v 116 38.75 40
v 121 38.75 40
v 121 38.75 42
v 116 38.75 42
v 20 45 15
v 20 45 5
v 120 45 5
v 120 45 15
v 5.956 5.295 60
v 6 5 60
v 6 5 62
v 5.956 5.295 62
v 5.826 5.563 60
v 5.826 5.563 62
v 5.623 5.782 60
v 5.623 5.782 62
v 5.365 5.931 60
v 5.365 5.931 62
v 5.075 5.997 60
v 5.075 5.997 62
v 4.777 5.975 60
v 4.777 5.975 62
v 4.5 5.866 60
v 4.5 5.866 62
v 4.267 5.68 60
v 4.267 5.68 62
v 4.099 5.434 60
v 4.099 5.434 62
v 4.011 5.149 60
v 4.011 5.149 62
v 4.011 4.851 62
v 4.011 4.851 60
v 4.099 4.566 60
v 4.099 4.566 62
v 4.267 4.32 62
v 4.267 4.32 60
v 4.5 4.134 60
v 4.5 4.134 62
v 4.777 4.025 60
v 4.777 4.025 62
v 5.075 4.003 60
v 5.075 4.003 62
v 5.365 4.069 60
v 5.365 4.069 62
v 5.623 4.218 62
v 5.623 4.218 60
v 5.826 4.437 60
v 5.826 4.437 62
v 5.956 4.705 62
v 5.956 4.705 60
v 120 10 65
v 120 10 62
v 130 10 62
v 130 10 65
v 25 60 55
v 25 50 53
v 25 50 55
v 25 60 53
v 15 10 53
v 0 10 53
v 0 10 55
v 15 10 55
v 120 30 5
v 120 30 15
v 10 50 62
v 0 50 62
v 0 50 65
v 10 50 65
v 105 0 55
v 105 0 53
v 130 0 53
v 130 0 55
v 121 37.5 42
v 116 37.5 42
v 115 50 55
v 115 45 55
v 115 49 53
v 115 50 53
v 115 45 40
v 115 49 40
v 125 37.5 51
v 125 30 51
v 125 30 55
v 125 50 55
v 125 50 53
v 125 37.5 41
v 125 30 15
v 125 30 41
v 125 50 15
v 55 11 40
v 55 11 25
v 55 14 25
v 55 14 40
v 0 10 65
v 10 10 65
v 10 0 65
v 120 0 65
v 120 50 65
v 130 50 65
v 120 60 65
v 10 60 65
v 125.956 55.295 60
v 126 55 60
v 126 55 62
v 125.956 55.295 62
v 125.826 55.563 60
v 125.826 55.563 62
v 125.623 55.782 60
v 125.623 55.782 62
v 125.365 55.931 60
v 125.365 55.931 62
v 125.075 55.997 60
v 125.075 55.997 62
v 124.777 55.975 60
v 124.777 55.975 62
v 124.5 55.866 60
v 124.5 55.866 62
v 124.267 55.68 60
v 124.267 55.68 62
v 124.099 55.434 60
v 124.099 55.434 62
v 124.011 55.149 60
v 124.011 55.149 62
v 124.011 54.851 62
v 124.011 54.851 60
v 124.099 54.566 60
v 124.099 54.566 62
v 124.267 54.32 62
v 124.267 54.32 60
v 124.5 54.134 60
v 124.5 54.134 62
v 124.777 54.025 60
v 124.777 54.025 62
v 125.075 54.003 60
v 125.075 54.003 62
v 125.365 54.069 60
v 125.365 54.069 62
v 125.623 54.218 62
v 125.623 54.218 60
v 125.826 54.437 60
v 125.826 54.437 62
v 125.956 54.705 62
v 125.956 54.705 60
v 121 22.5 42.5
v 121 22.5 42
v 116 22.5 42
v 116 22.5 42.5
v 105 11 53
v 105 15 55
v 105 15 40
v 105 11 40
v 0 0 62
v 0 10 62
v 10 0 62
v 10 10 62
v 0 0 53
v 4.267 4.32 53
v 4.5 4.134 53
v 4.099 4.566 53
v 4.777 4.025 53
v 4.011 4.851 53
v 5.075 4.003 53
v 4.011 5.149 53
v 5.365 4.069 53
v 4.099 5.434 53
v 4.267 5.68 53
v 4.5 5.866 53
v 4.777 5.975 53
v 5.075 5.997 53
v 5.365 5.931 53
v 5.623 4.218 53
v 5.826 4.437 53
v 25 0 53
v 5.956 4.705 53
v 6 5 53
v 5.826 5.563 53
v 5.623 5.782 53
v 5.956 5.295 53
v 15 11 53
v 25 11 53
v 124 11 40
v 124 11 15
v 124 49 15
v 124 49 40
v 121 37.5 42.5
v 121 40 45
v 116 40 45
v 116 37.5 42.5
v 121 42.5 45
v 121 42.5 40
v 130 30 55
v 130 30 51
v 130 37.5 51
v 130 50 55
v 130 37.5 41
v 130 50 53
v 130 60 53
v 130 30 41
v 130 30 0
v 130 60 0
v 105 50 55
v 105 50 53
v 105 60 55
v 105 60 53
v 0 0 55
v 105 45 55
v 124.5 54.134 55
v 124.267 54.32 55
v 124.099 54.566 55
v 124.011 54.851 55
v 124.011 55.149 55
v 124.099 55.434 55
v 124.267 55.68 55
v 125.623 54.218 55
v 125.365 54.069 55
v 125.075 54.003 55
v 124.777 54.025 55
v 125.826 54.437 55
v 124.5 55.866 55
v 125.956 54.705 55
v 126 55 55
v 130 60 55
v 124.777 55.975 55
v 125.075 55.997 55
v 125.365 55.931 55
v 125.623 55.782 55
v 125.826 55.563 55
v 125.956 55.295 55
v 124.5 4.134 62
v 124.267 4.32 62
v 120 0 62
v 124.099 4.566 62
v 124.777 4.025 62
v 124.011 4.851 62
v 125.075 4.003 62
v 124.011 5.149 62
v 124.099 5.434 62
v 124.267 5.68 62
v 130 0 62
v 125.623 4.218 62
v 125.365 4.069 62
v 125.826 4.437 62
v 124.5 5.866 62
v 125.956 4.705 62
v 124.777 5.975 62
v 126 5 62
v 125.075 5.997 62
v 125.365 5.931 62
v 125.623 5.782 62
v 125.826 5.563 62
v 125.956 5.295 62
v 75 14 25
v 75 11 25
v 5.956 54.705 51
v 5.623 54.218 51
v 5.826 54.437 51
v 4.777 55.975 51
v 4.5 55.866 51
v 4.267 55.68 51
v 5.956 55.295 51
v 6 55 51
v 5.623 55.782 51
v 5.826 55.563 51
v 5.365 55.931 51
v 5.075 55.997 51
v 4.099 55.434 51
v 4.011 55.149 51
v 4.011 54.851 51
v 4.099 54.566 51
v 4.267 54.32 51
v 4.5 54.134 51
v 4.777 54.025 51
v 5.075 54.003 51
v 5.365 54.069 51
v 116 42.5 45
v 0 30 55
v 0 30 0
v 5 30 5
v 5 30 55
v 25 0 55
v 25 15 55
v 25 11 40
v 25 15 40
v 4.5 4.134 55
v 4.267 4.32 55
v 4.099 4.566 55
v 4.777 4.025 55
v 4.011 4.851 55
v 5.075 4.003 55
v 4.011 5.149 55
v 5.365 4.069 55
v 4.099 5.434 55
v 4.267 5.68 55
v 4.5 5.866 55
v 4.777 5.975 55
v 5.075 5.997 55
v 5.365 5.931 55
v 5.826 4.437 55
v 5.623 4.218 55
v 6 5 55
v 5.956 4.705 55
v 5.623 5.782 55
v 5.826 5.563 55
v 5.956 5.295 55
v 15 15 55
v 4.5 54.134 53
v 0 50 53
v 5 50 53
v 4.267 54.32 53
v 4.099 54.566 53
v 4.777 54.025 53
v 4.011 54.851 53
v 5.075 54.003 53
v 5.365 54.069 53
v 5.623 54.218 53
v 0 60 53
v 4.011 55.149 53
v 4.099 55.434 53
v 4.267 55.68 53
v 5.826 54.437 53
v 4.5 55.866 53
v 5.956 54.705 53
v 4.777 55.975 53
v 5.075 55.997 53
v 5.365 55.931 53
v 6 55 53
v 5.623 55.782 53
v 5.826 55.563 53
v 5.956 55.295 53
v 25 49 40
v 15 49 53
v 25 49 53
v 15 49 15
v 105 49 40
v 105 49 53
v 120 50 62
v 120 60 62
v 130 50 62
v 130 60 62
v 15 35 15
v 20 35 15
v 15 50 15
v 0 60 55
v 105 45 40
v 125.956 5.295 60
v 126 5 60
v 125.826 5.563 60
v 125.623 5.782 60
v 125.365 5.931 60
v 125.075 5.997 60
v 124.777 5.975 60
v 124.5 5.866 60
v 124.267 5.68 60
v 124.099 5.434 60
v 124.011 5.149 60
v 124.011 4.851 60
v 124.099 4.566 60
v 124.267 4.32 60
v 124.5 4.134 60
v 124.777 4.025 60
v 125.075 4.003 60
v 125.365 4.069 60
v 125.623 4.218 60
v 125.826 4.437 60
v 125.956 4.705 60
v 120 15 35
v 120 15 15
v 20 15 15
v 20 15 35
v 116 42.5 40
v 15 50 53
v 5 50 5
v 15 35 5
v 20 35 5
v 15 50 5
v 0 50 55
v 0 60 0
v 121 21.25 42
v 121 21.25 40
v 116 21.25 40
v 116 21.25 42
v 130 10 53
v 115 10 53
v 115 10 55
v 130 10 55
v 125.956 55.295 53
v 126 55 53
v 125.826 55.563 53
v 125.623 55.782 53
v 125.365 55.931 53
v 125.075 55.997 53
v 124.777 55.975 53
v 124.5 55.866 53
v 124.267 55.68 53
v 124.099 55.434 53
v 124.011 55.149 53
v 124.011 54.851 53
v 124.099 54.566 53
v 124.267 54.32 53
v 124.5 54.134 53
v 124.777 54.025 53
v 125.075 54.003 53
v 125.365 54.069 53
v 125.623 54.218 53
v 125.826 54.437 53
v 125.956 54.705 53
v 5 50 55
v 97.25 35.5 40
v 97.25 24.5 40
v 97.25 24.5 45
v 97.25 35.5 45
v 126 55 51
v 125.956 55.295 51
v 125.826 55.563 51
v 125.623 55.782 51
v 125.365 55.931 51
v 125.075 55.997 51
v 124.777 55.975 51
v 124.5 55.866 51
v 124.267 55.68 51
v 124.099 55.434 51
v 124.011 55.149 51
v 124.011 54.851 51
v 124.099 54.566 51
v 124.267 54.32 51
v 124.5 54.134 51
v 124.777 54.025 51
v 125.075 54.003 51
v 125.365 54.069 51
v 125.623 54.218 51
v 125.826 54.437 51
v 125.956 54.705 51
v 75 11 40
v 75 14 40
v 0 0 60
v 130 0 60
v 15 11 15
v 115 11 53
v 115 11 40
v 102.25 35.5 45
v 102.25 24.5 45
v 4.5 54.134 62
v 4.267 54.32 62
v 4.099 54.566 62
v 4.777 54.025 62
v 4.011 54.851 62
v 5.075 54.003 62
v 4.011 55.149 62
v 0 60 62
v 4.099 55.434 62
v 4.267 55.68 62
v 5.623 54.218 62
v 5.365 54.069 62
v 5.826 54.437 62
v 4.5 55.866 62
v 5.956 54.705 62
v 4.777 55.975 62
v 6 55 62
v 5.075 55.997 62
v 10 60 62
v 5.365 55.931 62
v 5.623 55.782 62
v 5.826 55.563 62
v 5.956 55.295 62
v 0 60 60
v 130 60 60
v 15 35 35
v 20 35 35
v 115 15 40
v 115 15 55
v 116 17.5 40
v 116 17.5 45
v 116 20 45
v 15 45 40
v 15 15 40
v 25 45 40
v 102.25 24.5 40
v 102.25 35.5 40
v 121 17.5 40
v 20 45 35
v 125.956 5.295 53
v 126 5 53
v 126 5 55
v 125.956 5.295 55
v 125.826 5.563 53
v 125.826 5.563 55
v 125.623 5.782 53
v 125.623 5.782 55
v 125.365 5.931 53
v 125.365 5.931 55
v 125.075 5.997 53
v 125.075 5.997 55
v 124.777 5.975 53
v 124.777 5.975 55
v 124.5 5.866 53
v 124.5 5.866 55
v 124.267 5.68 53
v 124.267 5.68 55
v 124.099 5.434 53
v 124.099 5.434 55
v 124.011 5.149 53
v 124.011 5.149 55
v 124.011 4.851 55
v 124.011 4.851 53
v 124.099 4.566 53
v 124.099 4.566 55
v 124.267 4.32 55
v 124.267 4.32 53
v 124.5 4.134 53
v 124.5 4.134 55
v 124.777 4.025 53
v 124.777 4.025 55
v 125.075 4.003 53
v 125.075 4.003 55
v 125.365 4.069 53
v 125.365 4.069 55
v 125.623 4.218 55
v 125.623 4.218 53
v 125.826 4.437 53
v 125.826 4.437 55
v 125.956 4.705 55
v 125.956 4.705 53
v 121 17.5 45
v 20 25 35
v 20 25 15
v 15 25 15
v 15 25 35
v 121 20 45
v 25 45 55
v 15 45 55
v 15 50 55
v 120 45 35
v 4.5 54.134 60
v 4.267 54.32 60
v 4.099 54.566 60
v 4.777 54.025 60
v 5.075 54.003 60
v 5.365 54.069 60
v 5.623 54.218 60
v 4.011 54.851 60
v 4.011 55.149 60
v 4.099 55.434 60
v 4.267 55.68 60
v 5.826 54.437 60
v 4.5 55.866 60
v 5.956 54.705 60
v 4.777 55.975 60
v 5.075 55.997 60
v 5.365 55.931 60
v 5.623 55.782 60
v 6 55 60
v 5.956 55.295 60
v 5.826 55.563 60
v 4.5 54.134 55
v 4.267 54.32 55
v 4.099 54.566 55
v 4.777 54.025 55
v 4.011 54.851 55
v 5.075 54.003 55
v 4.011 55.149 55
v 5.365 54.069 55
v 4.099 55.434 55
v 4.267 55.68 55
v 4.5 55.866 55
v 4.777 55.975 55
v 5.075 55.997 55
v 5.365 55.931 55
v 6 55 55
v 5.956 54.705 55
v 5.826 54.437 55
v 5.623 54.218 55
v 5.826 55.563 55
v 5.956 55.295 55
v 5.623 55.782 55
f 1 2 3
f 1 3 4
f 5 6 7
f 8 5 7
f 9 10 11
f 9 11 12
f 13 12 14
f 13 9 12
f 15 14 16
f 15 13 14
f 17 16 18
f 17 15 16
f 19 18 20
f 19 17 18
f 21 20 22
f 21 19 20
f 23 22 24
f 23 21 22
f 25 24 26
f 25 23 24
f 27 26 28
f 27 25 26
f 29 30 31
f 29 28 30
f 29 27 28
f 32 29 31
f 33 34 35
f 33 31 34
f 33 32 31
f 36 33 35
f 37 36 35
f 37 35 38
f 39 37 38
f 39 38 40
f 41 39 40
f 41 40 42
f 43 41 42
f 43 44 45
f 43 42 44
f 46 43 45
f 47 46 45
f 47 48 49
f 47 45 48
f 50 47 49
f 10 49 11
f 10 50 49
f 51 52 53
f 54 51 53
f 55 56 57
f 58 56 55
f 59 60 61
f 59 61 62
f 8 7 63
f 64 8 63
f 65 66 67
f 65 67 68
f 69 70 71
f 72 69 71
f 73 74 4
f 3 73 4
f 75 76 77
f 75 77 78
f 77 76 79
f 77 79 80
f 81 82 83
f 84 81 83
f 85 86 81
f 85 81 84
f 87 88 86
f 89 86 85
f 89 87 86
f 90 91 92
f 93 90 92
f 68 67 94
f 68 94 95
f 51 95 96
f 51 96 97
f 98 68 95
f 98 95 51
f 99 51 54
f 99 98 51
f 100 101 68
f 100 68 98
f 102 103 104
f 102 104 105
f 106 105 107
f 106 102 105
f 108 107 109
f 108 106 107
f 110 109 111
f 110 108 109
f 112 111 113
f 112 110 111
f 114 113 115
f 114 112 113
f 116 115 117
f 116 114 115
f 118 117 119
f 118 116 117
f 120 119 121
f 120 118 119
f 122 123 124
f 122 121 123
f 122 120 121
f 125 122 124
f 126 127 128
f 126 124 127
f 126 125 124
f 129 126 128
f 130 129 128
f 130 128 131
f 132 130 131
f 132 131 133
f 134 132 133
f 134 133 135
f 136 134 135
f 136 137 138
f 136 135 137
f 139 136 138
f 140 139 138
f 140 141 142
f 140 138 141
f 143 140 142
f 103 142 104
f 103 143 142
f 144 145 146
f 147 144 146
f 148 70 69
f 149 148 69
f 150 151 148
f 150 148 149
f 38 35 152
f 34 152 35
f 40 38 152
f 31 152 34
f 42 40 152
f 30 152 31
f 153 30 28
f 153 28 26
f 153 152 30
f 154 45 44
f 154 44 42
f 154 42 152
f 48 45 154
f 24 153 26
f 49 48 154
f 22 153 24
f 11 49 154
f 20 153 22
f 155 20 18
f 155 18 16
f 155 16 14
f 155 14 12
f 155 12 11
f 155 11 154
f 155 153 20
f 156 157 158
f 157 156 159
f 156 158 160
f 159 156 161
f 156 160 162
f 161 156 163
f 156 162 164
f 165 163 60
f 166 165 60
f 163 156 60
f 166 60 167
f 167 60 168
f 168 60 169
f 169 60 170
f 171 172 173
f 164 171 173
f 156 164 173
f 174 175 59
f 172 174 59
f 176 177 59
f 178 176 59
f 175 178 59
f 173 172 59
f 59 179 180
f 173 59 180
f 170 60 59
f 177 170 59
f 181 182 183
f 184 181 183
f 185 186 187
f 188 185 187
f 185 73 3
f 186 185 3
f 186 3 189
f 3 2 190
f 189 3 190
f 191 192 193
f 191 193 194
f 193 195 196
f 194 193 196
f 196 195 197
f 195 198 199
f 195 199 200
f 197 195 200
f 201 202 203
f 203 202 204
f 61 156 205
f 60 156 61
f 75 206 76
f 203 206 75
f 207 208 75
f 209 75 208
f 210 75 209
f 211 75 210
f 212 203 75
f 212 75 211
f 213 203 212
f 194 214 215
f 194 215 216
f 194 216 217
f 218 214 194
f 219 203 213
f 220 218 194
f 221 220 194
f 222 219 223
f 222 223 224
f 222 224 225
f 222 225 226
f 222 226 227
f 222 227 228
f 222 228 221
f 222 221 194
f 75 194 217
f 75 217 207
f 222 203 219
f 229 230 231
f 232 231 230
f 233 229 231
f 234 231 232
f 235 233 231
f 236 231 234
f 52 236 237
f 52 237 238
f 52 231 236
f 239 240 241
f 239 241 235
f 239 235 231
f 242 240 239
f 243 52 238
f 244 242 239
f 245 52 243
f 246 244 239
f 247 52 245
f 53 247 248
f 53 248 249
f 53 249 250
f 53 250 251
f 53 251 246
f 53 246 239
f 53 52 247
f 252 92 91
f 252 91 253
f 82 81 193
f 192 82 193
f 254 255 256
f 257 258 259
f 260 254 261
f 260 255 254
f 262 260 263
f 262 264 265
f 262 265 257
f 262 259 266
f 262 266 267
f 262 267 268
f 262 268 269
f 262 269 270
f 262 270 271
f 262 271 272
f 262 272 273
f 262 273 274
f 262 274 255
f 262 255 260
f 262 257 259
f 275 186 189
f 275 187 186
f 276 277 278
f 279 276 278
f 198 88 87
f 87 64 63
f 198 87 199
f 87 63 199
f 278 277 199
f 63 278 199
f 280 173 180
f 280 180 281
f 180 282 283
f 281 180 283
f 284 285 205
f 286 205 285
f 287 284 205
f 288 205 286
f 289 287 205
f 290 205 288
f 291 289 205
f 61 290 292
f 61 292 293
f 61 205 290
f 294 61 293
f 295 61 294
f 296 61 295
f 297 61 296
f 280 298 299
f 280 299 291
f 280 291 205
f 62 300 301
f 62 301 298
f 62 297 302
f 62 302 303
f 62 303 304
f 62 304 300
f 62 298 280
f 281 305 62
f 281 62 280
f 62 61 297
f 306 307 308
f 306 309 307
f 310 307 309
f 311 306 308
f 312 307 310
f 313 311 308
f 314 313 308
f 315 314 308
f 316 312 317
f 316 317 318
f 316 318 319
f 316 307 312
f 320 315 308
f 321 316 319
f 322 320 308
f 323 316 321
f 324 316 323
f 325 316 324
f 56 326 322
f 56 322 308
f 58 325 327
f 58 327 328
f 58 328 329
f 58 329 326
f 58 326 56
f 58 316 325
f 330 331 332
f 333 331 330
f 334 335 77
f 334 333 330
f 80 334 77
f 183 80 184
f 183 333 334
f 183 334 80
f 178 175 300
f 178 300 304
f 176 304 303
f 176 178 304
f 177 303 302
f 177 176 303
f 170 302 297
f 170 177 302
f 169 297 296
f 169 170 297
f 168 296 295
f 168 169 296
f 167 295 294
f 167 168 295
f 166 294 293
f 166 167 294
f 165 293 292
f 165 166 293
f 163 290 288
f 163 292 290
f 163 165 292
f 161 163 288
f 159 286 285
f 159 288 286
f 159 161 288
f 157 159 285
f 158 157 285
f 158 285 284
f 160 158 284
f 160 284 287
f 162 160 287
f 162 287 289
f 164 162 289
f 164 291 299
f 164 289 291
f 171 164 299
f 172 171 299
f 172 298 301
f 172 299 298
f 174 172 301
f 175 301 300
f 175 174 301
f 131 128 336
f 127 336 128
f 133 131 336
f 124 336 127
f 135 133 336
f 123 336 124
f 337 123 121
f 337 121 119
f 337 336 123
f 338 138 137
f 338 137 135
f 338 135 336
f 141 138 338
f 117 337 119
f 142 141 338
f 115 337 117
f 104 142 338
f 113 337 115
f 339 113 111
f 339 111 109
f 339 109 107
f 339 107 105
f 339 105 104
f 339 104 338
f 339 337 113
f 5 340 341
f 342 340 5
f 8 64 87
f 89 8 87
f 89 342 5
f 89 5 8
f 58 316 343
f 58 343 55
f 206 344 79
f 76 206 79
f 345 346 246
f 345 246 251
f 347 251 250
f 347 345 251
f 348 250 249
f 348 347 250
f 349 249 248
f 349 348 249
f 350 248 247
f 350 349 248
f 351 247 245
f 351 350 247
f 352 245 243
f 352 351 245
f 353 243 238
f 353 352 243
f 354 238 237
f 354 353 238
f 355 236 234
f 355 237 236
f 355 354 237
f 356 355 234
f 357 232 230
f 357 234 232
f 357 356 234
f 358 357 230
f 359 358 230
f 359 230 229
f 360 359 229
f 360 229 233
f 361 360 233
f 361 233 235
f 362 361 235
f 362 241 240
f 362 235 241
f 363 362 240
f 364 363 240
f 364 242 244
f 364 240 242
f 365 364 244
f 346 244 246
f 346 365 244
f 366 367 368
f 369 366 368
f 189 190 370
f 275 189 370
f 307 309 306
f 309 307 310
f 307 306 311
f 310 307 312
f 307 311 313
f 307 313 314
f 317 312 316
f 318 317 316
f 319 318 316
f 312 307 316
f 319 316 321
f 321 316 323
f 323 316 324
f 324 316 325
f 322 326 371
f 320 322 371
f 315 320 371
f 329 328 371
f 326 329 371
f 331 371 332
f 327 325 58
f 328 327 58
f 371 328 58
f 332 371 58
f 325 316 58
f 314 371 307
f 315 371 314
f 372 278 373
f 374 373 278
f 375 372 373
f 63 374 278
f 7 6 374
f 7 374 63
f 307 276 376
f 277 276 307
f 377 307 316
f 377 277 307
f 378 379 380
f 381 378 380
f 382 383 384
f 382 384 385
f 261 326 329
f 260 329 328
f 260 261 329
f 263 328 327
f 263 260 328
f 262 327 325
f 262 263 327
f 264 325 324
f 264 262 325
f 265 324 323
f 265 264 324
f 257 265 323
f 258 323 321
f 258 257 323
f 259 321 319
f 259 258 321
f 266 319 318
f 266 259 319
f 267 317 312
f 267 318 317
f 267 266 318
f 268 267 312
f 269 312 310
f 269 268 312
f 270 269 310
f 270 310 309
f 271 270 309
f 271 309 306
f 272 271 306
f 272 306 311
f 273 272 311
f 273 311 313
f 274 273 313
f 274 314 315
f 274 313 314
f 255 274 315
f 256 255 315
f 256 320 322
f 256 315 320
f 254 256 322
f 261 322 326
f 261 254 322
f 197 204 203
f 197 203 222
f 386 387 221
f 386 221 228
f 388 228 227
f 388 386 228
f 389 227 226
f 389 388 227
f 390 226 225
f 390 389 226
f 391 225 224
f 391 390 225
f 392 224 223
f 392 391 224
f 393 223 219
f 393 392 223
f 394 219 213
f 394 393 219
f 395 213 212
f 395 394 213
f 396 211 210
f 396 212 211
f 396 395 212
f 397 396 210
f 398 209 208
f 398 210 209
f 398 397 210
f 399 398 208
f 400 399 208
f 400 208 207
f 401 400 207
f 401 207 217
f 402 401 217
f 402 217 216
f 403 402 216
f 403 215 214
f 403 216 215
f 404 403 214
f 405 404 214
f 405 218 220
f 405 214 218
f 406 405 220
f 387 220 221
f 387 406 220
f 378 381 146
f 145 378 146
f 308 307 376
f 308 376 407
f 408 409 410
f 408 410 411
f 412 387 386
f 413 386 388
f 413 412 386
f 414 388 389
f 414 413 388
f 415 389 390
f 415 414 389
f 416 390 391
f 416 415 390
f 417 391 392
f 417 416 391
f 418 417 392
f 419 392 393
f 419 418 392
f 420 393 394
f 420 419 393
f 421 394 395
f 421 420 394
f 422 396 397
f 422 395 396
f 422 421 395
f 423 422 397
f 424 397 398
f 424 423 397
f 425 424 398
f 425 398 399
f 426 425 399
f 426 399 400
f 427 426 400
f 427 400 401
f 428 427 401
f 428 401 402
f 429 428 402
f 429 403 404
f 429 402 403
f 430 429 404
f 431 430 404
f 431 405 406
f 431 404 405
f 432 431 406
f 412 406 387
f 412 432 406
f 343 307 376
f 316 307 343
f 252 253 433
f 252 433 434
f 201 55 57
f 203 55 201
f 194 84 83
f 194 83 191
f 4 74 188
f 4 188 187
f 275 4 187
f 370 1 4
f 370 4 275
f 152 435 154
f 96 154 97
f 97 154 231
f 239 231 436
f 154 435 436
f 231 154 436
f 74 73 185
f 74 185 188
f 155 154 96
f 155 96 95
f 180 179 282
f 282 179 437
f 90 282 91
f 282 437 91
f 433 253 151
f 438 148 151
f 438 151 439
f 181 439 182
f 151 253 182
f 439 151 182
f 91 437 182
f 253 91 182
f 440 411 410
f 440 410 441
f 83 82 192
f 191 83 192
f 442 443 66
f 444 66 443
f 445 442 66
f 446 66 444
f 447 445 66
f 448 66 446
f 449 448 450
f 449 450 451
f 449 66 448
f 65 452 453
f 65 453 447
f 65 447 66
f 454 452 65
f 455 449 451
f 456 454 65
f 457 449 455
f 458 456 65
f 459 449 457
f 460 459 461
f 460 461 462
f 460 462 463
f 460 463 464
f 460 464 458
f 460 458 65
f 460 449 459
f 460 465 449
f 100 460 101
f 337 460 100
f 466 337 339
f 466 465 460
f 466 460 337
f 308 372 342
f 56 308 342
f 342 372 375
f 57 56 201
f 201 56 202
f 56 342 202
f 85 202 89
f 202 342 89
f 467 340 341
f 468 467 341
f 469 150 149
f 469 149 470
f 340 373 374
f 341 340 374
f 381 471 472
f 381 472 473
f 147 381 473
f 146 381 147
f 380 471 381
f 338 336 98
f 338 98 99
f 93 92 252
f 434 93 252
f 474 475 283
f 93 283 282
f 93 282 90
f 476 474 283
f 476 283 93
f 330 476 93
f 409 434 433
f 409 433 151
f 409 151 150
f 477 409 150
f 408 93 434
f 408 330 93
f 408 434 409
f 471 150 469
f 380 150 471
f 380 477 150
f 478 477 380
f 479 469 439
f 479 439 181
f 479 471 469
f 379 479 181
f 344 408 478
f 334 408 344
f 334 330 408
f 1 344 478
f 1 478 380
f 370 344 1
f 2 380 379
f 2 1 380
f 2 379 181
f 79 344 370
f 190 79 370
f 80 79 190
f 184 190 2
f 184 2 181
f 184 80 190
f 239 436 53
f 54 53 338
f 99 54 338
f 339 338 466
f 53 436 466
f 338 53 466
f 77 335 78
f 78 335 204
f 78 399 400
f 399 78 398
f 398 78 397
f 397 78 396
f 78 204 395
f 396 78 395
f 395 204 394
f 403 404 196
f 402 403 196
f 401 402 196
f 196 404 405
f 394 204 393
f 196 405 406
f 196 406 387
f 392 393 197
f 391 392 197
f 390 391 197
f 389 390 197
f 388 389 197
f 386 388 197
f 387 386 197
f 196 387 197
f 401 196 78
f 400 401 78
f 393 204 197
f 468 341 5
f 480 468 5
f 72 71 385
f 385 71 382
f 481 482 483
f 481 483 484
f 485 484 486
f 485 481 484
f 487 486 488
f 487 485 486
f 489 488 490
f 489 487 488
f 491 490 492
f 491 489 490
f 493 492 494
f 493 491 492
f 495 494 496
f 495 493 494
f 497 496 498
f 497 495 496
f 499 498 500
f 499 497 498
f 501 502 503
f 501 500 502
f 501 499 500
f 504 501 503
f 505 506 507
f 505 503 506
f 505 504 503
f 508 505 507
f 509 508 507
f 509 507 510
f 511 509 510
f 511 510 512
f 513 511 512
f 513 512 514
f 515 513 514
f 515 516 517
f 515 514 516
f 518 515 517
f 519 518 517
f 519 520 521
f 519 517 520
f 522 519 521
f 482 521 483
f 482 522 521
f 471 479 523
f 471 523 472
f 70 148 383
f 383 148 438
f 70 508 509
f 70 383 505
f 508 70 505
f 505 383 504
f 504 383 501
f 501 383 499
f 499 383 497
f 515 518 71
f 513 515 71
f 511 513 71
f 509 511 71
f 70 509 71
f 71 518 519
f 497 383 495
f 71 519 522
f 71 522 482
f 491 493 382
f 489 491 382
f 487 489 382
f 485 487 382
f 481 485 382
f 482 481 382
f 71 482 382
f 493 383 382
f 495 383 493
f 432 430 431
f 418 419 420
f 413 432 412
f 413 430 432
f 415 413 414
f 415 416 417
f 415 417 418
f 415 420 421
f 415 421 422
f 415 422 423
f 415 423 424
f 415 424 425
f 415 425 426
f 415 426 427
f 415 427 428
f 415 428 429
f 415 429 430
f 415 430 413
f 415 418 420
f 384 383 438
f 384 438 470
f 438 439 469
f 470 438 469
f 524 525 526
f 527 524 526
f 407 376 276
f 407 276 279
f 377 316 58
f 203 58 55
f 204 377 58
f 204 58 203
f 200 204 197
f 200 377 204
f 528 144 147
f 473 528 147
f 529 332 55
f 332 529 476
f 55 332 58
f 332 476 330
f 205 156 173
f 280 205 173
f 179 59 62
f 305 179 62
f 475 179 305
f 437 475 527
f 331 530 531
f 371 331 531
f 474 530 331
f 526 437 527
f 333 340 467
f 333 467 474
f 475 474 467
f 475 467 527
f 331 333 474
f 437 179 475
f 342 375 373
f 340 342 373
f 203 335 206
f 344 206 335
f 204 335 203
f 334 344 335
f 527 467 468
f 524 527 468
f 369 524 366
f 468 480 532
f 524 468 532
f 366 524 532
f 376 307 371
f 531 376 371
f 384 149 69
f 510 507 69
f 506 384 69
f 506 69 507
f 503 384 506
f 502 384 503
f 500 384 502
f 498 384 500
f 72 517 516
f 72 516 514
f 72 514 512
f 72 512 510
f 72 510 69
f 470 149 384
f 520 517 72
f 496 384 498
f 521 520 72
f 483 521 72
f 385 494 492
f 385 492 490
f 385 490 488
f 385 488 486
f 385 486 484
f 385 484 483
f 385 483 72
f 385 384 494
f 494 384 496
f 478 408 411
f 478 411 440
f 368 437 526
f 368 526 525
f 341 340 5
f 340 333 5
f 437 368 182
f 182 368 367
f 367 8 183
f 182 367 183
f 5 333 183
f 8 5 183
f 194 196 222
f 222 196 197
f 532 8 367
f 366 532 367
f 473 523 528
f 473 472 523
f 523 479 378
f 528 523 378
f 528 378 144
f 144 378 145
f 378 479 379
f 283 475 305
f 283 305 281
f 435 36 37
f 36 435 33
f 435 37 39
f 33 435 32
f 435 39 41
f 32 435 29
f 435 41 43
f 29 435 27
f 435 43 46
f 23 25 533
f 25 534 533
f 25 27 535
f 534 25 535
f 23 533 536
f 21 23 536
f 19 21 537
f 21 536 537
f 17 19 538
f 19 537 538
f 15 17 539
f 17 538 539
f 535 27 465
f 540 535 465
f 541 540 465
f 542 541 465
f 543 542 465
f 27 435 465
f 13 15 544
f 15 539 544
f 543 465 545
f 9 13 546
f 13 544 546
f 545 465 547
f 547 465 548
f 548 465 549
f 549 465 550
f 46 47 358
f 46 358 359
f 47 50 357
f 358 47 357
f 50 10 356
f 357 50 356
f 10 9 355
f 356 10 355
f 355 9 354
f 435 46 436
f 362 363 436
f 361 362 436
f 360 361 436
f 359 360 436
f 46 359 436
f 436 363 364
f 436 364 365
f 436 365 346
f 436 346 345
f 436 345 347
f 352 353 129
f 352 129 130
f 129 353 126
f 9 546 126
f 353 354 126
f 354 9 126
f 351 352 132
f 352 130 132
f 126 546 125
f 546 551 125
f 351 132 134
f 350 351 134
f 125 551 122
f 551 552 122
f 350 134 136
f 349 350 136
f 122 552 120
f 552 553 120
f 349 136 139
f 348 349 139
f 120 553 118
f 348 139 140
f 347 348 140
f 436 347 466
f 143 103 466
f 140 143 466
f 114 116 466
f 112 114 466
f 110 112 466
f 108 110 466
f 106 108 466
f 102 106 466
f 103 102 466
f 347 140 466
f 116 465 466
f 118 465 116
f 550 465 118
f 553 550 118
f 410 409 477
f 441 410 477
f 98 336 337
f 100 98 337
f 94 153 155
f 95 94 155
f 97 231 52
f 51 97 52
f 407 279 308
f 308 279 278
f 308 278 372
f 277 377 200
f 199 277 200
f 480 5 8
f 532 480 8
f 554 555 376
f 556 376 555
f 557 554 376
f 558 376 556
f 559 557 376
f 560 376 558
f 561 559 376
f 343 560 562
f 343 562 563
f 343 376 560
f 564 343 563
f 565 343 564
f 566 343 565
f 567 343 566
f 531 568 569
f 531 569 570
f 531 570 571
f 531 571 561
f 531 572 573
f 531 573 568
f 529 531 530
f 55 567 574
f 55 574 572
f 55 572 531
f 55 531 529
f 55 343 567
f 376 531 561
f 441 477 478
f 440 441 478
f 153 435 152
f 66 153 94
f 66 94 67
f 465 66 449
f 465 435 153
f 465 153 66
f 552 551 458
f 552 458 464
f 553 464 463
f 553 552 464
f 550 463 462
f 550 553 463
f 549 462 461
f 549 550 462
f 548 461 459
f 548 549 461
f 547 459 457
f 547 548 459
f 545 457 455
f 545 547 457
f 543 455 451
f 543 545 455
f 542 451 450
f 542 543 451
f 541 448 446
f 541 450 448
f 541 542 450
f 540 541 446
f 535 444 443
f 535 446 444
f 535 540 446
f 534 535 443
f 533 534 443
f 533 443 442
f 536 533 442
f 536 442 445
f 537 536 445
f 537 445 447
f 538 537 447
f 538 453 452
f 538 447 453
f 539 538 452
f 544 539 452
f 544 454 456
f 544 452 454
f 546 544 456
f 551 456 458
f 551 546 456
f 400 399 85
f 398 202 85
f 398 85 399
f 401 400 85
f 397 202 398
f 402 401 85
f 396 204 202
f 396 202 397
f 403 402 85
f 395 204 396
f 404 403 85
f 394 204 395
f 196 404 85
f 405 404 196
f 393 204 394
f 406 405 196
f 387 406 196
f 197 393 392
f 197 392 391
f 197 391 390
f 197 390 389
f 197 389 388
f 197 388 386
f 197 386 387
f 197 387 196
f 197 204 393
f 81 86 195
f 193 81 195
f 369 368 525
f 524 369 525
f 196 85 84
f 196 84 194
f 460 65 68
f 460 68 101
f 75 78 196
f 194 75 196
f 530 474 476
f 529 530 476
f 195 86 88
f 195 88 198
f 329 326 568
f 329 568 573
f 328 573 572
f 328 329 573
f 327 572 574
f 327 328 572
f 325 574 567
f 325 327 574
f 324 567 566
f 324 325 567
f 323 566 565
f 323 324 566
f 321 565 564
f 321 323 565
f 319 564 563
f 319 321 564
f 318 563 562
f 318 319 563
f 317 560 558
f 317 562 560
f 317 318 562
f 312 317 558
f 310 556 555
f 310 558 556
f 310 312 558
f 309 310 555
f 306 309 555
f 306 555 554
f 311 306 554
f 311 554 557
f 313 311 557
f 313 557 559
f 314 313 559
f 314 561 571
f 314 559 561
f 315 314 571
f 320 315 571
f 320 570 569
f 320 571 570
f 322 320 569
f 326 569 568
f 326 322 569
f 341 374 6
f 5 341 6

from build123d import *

# Parameters (mm, degrees)
CYLINDER002_R           = 1
CYLINDER002_DEPTH       = 20
BOX007_W                = 10
BOX007_H                = 10
BOX007_DEPTH            = 10
ARRAY005_X_COUNT        = 2
ARRAY005_X_PITCH        = 120
ARRAY005_Y_COUNT        = 2
ARRAY005_Y_PITCH        = 50
BOX002_W                = 130
BOX002_H                = 60
BOX002_DEPTH            = 5
BOX015_W                = 20
BOX015_H                = 3
BOX015_DEPTH            = 15
CYLINDER003_R           = 1
CYLINDER003_DEPTH       = 10
ARRAY009_X_COUNT        = 2
ARRAY009_X_PITCH        = 120
ARRAY009_Y_COUNT        = 2
ARRAY009_Y_PITCH        = 50
BOX011_W                = 25
BOX011_H                = 10
BOX011_DEPTH            = 2
ARRAY008_X_COUNT        = 2
ARRAY008_X_PITCH        = 105
ARRAY008_Y_COUNT        = 2
ARRAY008_Y_PITCH        = 50
BOX010_W                = 10
BOX010_H                = 15
BOX010_DEPTH            = 2
ARRAY007_X_COUNT        = 2
ARRAY007_X_PITCH        = 90
ARRAY007_Y_COUNT        = 2
ARRAY007_Y_PITCH        = 45
BOX009_W                = 10
BOX009_H                = 4
BOX009_DEPTH            = 15
ARRAY006_X_COUNT        = 2
ARRAY006_X_PITCH        = 90
ARRAY006_Y_COUNT        = 2
ARRAY006_Y_PITCH        = 34
BOX008_W                = 109
BOX008_H                = 38
BOX008_DEPTH            = 5
PAD001_DEPTH            = 20
SKETCH002_W             = 5
SKETCH002_H             = 11
PAD002_DEPTH            = 5
BOX013_W                = 17.5
BOX013_H                = 5
BOX013_DEPTH            = 2
BOX012_W                = 5
BOX012_H                = 5
BOX012_DEPTH            = 5
ARRAY010_X_COUNT        = 2
ARRAY010_X_PITCH        = 20
CHAMFER_SIZE            = 2.5
CHAMFER_PLACEMENT_ANGLE = 90
BOX016_W                = 130
BOX016_H                = 30
BOX016_DEPTH            = 60
BOX014_W                = 7
BOX014_H                = 15
BOX014_DEPTH            = 10
CYLINDER001_R           = 1
CYLINDER001_DEPTH       = 3
ARRAY004_X_COUNT        = 2
ARRAY004_X_PITCH        = 120
ARRAY004_Y_COUNT        = 2
ARRAY004_Y_PITCH        = 50
CYLINDER_R              = 1.5
CYLINDER_DEPTH          = 30
CYLINDER_ROLL_ANGLE     = 90
ARRAY003_X_COUNT        = 2
ARRAY003_X_PITCH        = 50
ARRAY003_Y_COUNT        = 2
ARRAY003_Y_PITCH        = 20
BOX006_W                = 25
BOX006_H                = 10
BOX006_DEPTH            = 2
ARRAY002_X_COUNT        = 2
ARRAY002_X_PITCH        = 105
ARRAY002_Y_COUNT        = 2
ARRAY002_Y_PITCH        = 50
BOX005_W                = 10
BOX005_H                = 10
BOX005_DEPTH            = 10
ARRAY001_X_COUNT        = 2
ARRAY001_X_PITCH        = 50
BOX004_W                = 10
BOX004_H                = 2
BOX004_DEPTH            = 10
ARRAY_X_COUNT           = 2
ARRAY_X_PITCH           = 50
ARRAY_Y_COUNT           = 2
ARRAY_Y_PITCH           = 20
BOX003_W                = 60
BOX003_H                = 10
BOX003_DEPTH            = 30
BOX001_W                = 120
BOX001_H                = 40
BOX001_DEPTH            = 50
BOX_W                   = 130
BOX_H                   = 60
BOX_DEPTH               = 55
PAD_DEPTH               = 10


with BuildPart() as cilindro002:
    # Cylinder002 → Cylinder002 (new body)
    with BuildSketch(Plane(origin=(5, 5, -5), x_dir=(1, 0, 0), z_dir=(0, 0, 1))):
        Circle(CYLINDER002_R)
    extrude(amount=CYLINDER002_DEPTH)


with BuildPart() as huecostapa:
    # Box007 → Box007 (new body)
    with BuildSketch(Plane.XY):
        with Locations((5, 5)):
            Rectangle(BOX007_W, BOX007_H)
    extrude(amount=BOX007_DEPTH)

    # Fusion: union Cilindro002
    add(cilindro002.part)

    # Array005 X: HuecosTapa ×2


with BuildPart() as huecostapa_1:
    add(huecostapa.part)
    with Locations(*[(i * ARRAY005_X_PITCH, 0, 0) for i in range(1, ARRAY005_X_COUNT)]):
        add(huecostapa.part)

    # Array005 Y: HuecosTapa ×2


with BuildPart() as huecostapa_2:
    add(huecostapa_1.part)
    with Locations(*[(0, i * ARRAY005_Y_PITCH, 0) for i in range(1, ARRAY005_Y_COUNT)]):
        add(huecostapa_1.part)


with BuildPart() as huecostapa_3:
    # Array005 placement: moved
    add(huecostapa_2.part.moved(Location((0, 0, 62))))


with BuildPart() as tapa:
    # Box002 → Box002 (new body)
    with BuildSketch(Plane.XY.offset(60)):
        with Locations((65, 30)):
            Rectangle(BOX002_W, BOX002_H)
    extrude(amount=BOX002_DEPTH)

    # Cut007: cut HuecosTapa
    add(huecostapa_3.part, mode=Mode.SUBTRACT)


with BuildPart() as hueco_tornillo_conector:
    # Box015 → Box015 (new body)
    with BuildSketch(Plane(origin=(55, 11, 25), x_dir=(1, 0, 0), z_dir=(0, 0, 1))):
        with Locations((10, 1.5)):
            Rectangle(BOX015_W, BOX015_H)
    extrude(amount=BOX015_DEPTH)


with BuildPart() as array009:
    # Cylinder003 → Cylinder003 (new body)
    with BuildSketch(Plane.XY):
        Circle(CYLINDER003_R)
    extrude(amount=CYLINDER003_DEPTH)

    # Array009 X: Array009 ×2


with BuildPart() as array009_1:
    add(array009.part)
    with Locations(*[(i * ARRAY009_X_PITCH, 0, 0) for i in range(1, ARRAY009_X_COUNT)]):
        add(array009.part)

    # Array009 Y: Array009 ×2


with BuildPart() as array009_2:
    add(array009_1.part)
    with Locations(*[(0, i * ARRAY009_Y_PITCH, 0) for i in range(1, ARRAY009_Y_COUNT)]):
        add(array009_1.part)


with BuildPart() as array009_3:
    # Array009 placement: moved
    add(array009_2.part.moved(Location((-10, -6, 13))))


with BuildPart() as array008:
    # Box011 → Box011 (new body)
    with BuildSketch(Plane(origin=(-15, -11, 18), x_dir=(1, 0, 0), z_dir=(0, 0, 1))):
        with Locations((12.5, 5)):
            Rectangle(BOX011_W, BOX011_H)
    extrude(amount=BOX011_DEPTH)

    # Array008 X: Array008 ×2


with BuildPart() as array008_1:
    add(array008.part)
    with Locations(*[(i * ARRAY008_X_PITCH, 0, 0) for i in range(1, ARRAY008_X_COUNT)]):
        add(array008.part)

    # Array008 Y: Array008 ×2


with BuildPart() as array008_2:
    add(array008_1.part)
    with Locations(*[(0, i * ARRAY008_Y_PITCH, 0) for i in range(1, ARRAY008_Y_COUNT)]):
        add(array008_1.part)


with BuildPart() as array007:
    # Box010 → Box010 (new body)
    with BuildSketch(Plane(origin=(0, -11, 18), x_dir=(1, 0, 0), z_dir=(0, 0, 1))):
        with Locations((5, 7.5)):
            Rectangle(BOX010_W, BOX010_H)
    extrude(amount=BOX010_DEPTH)

    # Array007 X: Array007 ×2


with BuildPart() as array007_1:
    add(array007.part)
    with Locations(*[(i * ARRAY007_X_PITCH, 0, 0) for i in range(1, ARRAY007_X_COUNT)]):
        add(array007.part)

    # Array007 Y: Array007 ×2


with BuildPart() as array007_2:
    add(array007_1.part)
    with Locations(*[(0, i * ARRAY007_Y_PITCH, 0) for i in range(1, ARRAY007_Y_COUNT)]):
        add(array007_1.part)


with BuildPart() as array006:
    # Box009 → Box009 (new body)
    with BuildSketch(Plane.XY.offset(5)):
        with Locations((5, 2)):
            Rectangle(BOX009_W, BOX009_H)
    extrude(amount=BOX009_DEPTH)

    # Array006 X: Array006 ×2


with BuildPart() as array006_1:
    add(array006.part)
    with Locations(*[(i * ARRAY006_X_PITCH, 0, 0) for i in range(1, ARRAY006_X_COUNT)]):
        add(array006.part)

    # Array006 Y: Array006 ×2


with BuildPart() as array006_2:
    add(array006_1.part)
    with Locations(*[(0, i * ARRAY006_Y_PITCH, 0) for i in range(1, ARRAY006_Y_COUNT)]):
        add(array006_1.part)


with BuildPart() as cut008:
    # Box008 → Box008 (new body)
    with BuildSketch(Plane.XY):
        with Locations((54.5, 19)):
            Rectangle(BOX008_W, BOX008_H)
    extrude(amount=BOX008_DEPTH)

    # Fusion001: union Array006
    add(array006_2.part)

    # Fusion002: union Array007
    add(array007_2.part)

    # Fusion003: union Array008
    add(array008_2.part)

    # Cut008: cut Array009
    add(array009_3.part, mode=Mode.SUBTRACT)


with BuildPart() as cut008_1:
    # Cut008 placement: moved
    add(cut008.part.moved(Location((0, 0, 20))))


with BuildPart() as cut011:
    # Sketch001 → Pad001 (new body)
    with BuildSketch(Plane.XY):
        Polygon((0, 24), (5, 24), (5, 34), (105, 34), (105, 4), (5, 4), (5, 14), (0, 14), (0, 0), (109, 0), (109, 38), (0, 38), align=None)
    extrude(amount=PAD001_DEPTH)

    # Fusion004: union Cut008
    add(cut008_1.part)


with BuildPart() as cut011_1:
    # Fusion004 placement: moved
    add(cut011.part.moved(Location((15, 11, 15))))

    # Sketch002 (on Face19 of Fusion004) → Pad002 (new body)
    with BuildSketch(Plane(origin=(15, 11, 40), x_dir=(1, 0, 0), z_dir=(0, 0, 1))):
        with Locations((84.75, 19)):
            Rectangle(SKETCH002_W, SKETCH002_H)
    extrude(amount=PAD002_DEPTH)

    # Cut011: cut Hueco_Tornillo_Conector
    add(hueco_tornillo_conector.part, mode=Mode.SUBTRACT)


with BuildPart() as clavijas_hueco:
    # Box013 → Box013 (new body)
    with BuildSketch(Plane(origin=(3.75, 0, 0), x_dir=(1, 0, 0), z_dir=(0, 0, 1))):
        with Locations((8.75, 2.5)):
            Rectangle(BOX013_W, BOX013_H)
    extrude(amount=BOX013_DEPTH)


with BuildPart() as soporte:
    # Box012 → Box012 (new body)
    with BuildSketch(Plane.XY):
        with Locations((2.5, 2.5)):
            Rectangle(BOX012_W, BOX012_H)
    extrude(amount=BOX012_DEPTH)

    # Array010 X: Soporte ×2


with BuildPart() as soporte_1:
    add(soporte.part)
    with Locations(*[(i * ARRAY010_X_PITCH, 0, 0) for i in range(1, ARRAY010_X_COUNT)]):
        add(soporte.part)

    # Cut009: cut Clavijas_hueco
    add(clavijas_hueco.part, mode=Mode.SUBTRACT)

    # Chamfer
    chamfer_edges = [soporte_1.edges().sort_by_distance(p)[0] for p in [
        (5, 2.5, 5),
        (20, 2.5, 5),
    ]]
    chamfer(chamfer_edges, length=CHAMFER_SIZE)


with BuildPart() as soporte_2:
    # Chamfer placement: moved
    add(soporte_1.part.moved(Location((121, 17.5, 40))).rotate(Axis((121, 17.5, 40), (0, 0, 1)), CHAMFER_PLACEMENT_ANGLE))

    # Fusion005: union Cut011
    add(cut011_1.part)


with BuildPart() as corte:
    # Box016 → Box016 (new body)
    with BuildSketch(Plane.XY):
        with Locations((65, 15)):
            Rectangle(BOX016_W, BOX016_H)
    extrude(amount=BOX016_DEPTH)


with BuildPart() as huecousb:
    # Box014 → Box014 (new body)
    with BuildSketch(Plane(origin=(124, 22.5, 41), x_dir=(1, 0, 0), z_dir=(0, 0, 1))):
        with Locations((3.5, 7.5)):
            Rectangle(BOX014_W, BOX014_H)
    extrude(amount=BOX014_DEPTH)


with BuildPart() as array004:
    # Cylinder001 → Cylinder001 (new body)
    with BuildSketch(Plane.XY):
        Circle(CYLINDER001_R)
    extrude(amount=CYLINDER001_DEPTH)

    # Array004 X: Array004 ×2


with BuildPart() as array004_1:
    add(array004.part)
    with Locations(*[(i * ARRAY004_X_PITCH, 0, 0) for i in range(1, ARRAY004_X_COUNT)]):
        add(array004.part)

    # Array004 Y: Array004 ×2


with BuildPart() as array004_2:
    add(array004_1.part)
    with Locations(*[(0, i * ARRAY004_Y_PITCH, 0) for i in range(1, ARRAY004_Y_COUNT)]):
        add(array004_1.part)


with BuildPart() as array004_3:
    # Array004 placement: moved
    add(array004_2.part.moved(Location((5, 5, 51))))


with BuildPart() as array003:
    # Cylinder → Cylinder (new body)
    with BuildSketch(Plane.XY):
        Circle(CYLINDER_R)
    extrude(amount=CYLINDER_DEPTH)


with BuildPart() as array003_1:
    # Cylinder roll: moved
    add(array003.part.rotate(Axis((0, 0, 0), (1, 0, 0)), CYLINDER_ROLL_ANGLE))


with BuildPart() as array003_2:
    # Cylinder placement: moved
    add(array003_1.part)

    # Array003 X: Array003 ×2


with BuildPart() as array003_3:
    add(array003_2.part)
    with Locations(*[(i * ARRAY003_X_PITCH, 0, 0) for i in range(1, ARRAY003_X_COUNT)]):
        add(array003_2.part)

    # Array003 Y: Array003 ×2


with BuildPart() as array003_4:
    add(array003_3.part)
    with Locations(*[(0, 0, i * ARRAY003_Y_PITCH) for i in range(1, ARRAY003_Y_COUNT)]):
        add(array003_3.part)


with BuildPart() as array003_5:
    # Array003 placement: moved
    add(array003_4.part.moved(Location((40, 15, 20))))


with BuildPart() as array002:
    # Box006 → Box006 (new body)
    with BuildSketch(Plane.XY):
        with Locations((12.5, 5)):
            Rectangle(BOX006_W, BOX006_H)
    extrude(amount=BOX006_DEPTH)

    # Array002 X: Array002 ×2


with BuildPart() as array002_1:
    add(array002.part)
    with Locations(*[(i * ARRAY002_X_PITCH, 0, 0) for i in range(1, ARRAY002_X_COUNT)]):
        add(array002.part)

    # Array002 Y: Array002 ×2


with BuildPart() as array002_2:
    add(array002_1.part)
    with Locations(*[(0, i * ARRAY002_Y_PITCH, 0) for i in range(1, ARRAY002_Y_COUNT)]):
        add(array002_1.part)


with BuildPart() as array002_3:
    # Array002 placement: moved
    add(array002_2.part.moved(Location((0, 0, 53))))


with BuildPart() as array001:
    # Box005 → Box005 (new body)
    with BuildSketch(Plane(origin=(35, 0, 25), x_dir=(1, 0, 0), z_dir=(0, 0, 1))):
        with Locations((5, 5)):
            Rectangle(BOX005_W, BOX005_H)
    extrude(amount=BOX005_DEPTH)

    # Array001 X: Array001 ×2


with BuildPart() as array001_1:
    add(array001.part)
    with Locations(*[(i * ARRAY001_X_PITCH, 0, 0) for i in range(1, ARRAY001_X_COUNT)]):
        add(array001.part)


with BuildPart() as array:
    # Box004 → Box004 (new body)
    with BuildSketch(Plane.XY):
        with Locations((5, 1)):
            Rectangle(BOX004_W, BOX004_H)
    extrude(amount=BOX004_DEPTH)

    # Array X: Array ×2


with BuildPart() as array_1:
    add(array.part)
    with Locations(*[(i * ARRAY_X_PITCH, 0, 0) for i in range(1, ARRAY_X_COUNT)]):
        add(array.part)

    # Array Y: Array ×2


with BuildPart() as array_2:
    add(array_1.part)
    with Locations(*[(0, 0, i * ARRAY_Y_PITCH) for i in range(1, ARRAY_Y_COUNT)]):
        add(array_1.part)


with BuildPart() as array_3:
    # Array placement: moved
    add(array_2.part.moved(Location((0, 5, 0))))


with BuildPart() as cut002:
    # Box003 → Box003 (new body)
    with BuildSketch(Plane.XY):
        with Locations((30, 5)):
            Rectangle(BOX003_W, BOX003_H)
    extrude(amount=BOX003_DEPTH)

    # Cut001: cut Array
    add(array_3.part, mode=Mode.SUBTRACT)


with BuildPart() as cut002_1:
    # Cut001 placement: moved
    add(cut002.part.moved(Location((35, 0, 15))))

    # Cut002: cut Array001
    add(array001_1.part, mode=Mode.SUBTRACT)


with BuildPart() as interior:
    # Box001 → Box001 (new body)
    with BuildSketch(Plane(origin=(5, 10, 5), x_dir=(1, 0, 0), z_dir=(0, 0, 1))):
        with Locations((60, 20)):
            Rectangle(BOX001_W, BOX001_H)
    extrude(amount=BOX001_DEPTH)


with BuildPart() as seccionxz:
    # Box → Box (new body)
    with BuildSketch(Plane.XY):
        with Locations((65, 30)):
            Rectangle(BOX_W, BOX_H)
    extrude(amount=BOX_DEPTH)

    # Cut: cut Interior
    add(interior.part, mode=Mode.SUBTRACT)

    # Cut003: cut Cut002
    add(cut002_1.part, mode=Mode.SUBTRACT)

    # Cut004: cut Array002
    add(array002_3.part, mode=Mode.SUBTRACT)

    # Sketch (on Face54 of Cut004) → Pad (new body)
    with BuildSketch(Plane.XY.offset(5)):
        Polygon((15, 35), (20, 35), (20, 45), (120, 45), (120, 15), (20, 15), (20, 25), (15, 25), (15, 10), (125, 10), (125, 50), (15, 50), align=None)
    extrude(amount=PAD_DEPTH)

    # Cut005: cut Array003
    add(array003_5.part, mode=Mode.SUBTRACT)

    # Cut006: cut Array004
    add(array004_3.part, mode=Mode.SUBTRACT)

    # Cut010: cut HuecoUSB
    add(huecousb.part, mode=Mode.SUBTRACT)

    # Cut012: cut Corte
    add(corte.part, mode=Mode.SUBTRACT)


solid = Compound([tapa.part, soporte_2.part, seccionxz.part])
